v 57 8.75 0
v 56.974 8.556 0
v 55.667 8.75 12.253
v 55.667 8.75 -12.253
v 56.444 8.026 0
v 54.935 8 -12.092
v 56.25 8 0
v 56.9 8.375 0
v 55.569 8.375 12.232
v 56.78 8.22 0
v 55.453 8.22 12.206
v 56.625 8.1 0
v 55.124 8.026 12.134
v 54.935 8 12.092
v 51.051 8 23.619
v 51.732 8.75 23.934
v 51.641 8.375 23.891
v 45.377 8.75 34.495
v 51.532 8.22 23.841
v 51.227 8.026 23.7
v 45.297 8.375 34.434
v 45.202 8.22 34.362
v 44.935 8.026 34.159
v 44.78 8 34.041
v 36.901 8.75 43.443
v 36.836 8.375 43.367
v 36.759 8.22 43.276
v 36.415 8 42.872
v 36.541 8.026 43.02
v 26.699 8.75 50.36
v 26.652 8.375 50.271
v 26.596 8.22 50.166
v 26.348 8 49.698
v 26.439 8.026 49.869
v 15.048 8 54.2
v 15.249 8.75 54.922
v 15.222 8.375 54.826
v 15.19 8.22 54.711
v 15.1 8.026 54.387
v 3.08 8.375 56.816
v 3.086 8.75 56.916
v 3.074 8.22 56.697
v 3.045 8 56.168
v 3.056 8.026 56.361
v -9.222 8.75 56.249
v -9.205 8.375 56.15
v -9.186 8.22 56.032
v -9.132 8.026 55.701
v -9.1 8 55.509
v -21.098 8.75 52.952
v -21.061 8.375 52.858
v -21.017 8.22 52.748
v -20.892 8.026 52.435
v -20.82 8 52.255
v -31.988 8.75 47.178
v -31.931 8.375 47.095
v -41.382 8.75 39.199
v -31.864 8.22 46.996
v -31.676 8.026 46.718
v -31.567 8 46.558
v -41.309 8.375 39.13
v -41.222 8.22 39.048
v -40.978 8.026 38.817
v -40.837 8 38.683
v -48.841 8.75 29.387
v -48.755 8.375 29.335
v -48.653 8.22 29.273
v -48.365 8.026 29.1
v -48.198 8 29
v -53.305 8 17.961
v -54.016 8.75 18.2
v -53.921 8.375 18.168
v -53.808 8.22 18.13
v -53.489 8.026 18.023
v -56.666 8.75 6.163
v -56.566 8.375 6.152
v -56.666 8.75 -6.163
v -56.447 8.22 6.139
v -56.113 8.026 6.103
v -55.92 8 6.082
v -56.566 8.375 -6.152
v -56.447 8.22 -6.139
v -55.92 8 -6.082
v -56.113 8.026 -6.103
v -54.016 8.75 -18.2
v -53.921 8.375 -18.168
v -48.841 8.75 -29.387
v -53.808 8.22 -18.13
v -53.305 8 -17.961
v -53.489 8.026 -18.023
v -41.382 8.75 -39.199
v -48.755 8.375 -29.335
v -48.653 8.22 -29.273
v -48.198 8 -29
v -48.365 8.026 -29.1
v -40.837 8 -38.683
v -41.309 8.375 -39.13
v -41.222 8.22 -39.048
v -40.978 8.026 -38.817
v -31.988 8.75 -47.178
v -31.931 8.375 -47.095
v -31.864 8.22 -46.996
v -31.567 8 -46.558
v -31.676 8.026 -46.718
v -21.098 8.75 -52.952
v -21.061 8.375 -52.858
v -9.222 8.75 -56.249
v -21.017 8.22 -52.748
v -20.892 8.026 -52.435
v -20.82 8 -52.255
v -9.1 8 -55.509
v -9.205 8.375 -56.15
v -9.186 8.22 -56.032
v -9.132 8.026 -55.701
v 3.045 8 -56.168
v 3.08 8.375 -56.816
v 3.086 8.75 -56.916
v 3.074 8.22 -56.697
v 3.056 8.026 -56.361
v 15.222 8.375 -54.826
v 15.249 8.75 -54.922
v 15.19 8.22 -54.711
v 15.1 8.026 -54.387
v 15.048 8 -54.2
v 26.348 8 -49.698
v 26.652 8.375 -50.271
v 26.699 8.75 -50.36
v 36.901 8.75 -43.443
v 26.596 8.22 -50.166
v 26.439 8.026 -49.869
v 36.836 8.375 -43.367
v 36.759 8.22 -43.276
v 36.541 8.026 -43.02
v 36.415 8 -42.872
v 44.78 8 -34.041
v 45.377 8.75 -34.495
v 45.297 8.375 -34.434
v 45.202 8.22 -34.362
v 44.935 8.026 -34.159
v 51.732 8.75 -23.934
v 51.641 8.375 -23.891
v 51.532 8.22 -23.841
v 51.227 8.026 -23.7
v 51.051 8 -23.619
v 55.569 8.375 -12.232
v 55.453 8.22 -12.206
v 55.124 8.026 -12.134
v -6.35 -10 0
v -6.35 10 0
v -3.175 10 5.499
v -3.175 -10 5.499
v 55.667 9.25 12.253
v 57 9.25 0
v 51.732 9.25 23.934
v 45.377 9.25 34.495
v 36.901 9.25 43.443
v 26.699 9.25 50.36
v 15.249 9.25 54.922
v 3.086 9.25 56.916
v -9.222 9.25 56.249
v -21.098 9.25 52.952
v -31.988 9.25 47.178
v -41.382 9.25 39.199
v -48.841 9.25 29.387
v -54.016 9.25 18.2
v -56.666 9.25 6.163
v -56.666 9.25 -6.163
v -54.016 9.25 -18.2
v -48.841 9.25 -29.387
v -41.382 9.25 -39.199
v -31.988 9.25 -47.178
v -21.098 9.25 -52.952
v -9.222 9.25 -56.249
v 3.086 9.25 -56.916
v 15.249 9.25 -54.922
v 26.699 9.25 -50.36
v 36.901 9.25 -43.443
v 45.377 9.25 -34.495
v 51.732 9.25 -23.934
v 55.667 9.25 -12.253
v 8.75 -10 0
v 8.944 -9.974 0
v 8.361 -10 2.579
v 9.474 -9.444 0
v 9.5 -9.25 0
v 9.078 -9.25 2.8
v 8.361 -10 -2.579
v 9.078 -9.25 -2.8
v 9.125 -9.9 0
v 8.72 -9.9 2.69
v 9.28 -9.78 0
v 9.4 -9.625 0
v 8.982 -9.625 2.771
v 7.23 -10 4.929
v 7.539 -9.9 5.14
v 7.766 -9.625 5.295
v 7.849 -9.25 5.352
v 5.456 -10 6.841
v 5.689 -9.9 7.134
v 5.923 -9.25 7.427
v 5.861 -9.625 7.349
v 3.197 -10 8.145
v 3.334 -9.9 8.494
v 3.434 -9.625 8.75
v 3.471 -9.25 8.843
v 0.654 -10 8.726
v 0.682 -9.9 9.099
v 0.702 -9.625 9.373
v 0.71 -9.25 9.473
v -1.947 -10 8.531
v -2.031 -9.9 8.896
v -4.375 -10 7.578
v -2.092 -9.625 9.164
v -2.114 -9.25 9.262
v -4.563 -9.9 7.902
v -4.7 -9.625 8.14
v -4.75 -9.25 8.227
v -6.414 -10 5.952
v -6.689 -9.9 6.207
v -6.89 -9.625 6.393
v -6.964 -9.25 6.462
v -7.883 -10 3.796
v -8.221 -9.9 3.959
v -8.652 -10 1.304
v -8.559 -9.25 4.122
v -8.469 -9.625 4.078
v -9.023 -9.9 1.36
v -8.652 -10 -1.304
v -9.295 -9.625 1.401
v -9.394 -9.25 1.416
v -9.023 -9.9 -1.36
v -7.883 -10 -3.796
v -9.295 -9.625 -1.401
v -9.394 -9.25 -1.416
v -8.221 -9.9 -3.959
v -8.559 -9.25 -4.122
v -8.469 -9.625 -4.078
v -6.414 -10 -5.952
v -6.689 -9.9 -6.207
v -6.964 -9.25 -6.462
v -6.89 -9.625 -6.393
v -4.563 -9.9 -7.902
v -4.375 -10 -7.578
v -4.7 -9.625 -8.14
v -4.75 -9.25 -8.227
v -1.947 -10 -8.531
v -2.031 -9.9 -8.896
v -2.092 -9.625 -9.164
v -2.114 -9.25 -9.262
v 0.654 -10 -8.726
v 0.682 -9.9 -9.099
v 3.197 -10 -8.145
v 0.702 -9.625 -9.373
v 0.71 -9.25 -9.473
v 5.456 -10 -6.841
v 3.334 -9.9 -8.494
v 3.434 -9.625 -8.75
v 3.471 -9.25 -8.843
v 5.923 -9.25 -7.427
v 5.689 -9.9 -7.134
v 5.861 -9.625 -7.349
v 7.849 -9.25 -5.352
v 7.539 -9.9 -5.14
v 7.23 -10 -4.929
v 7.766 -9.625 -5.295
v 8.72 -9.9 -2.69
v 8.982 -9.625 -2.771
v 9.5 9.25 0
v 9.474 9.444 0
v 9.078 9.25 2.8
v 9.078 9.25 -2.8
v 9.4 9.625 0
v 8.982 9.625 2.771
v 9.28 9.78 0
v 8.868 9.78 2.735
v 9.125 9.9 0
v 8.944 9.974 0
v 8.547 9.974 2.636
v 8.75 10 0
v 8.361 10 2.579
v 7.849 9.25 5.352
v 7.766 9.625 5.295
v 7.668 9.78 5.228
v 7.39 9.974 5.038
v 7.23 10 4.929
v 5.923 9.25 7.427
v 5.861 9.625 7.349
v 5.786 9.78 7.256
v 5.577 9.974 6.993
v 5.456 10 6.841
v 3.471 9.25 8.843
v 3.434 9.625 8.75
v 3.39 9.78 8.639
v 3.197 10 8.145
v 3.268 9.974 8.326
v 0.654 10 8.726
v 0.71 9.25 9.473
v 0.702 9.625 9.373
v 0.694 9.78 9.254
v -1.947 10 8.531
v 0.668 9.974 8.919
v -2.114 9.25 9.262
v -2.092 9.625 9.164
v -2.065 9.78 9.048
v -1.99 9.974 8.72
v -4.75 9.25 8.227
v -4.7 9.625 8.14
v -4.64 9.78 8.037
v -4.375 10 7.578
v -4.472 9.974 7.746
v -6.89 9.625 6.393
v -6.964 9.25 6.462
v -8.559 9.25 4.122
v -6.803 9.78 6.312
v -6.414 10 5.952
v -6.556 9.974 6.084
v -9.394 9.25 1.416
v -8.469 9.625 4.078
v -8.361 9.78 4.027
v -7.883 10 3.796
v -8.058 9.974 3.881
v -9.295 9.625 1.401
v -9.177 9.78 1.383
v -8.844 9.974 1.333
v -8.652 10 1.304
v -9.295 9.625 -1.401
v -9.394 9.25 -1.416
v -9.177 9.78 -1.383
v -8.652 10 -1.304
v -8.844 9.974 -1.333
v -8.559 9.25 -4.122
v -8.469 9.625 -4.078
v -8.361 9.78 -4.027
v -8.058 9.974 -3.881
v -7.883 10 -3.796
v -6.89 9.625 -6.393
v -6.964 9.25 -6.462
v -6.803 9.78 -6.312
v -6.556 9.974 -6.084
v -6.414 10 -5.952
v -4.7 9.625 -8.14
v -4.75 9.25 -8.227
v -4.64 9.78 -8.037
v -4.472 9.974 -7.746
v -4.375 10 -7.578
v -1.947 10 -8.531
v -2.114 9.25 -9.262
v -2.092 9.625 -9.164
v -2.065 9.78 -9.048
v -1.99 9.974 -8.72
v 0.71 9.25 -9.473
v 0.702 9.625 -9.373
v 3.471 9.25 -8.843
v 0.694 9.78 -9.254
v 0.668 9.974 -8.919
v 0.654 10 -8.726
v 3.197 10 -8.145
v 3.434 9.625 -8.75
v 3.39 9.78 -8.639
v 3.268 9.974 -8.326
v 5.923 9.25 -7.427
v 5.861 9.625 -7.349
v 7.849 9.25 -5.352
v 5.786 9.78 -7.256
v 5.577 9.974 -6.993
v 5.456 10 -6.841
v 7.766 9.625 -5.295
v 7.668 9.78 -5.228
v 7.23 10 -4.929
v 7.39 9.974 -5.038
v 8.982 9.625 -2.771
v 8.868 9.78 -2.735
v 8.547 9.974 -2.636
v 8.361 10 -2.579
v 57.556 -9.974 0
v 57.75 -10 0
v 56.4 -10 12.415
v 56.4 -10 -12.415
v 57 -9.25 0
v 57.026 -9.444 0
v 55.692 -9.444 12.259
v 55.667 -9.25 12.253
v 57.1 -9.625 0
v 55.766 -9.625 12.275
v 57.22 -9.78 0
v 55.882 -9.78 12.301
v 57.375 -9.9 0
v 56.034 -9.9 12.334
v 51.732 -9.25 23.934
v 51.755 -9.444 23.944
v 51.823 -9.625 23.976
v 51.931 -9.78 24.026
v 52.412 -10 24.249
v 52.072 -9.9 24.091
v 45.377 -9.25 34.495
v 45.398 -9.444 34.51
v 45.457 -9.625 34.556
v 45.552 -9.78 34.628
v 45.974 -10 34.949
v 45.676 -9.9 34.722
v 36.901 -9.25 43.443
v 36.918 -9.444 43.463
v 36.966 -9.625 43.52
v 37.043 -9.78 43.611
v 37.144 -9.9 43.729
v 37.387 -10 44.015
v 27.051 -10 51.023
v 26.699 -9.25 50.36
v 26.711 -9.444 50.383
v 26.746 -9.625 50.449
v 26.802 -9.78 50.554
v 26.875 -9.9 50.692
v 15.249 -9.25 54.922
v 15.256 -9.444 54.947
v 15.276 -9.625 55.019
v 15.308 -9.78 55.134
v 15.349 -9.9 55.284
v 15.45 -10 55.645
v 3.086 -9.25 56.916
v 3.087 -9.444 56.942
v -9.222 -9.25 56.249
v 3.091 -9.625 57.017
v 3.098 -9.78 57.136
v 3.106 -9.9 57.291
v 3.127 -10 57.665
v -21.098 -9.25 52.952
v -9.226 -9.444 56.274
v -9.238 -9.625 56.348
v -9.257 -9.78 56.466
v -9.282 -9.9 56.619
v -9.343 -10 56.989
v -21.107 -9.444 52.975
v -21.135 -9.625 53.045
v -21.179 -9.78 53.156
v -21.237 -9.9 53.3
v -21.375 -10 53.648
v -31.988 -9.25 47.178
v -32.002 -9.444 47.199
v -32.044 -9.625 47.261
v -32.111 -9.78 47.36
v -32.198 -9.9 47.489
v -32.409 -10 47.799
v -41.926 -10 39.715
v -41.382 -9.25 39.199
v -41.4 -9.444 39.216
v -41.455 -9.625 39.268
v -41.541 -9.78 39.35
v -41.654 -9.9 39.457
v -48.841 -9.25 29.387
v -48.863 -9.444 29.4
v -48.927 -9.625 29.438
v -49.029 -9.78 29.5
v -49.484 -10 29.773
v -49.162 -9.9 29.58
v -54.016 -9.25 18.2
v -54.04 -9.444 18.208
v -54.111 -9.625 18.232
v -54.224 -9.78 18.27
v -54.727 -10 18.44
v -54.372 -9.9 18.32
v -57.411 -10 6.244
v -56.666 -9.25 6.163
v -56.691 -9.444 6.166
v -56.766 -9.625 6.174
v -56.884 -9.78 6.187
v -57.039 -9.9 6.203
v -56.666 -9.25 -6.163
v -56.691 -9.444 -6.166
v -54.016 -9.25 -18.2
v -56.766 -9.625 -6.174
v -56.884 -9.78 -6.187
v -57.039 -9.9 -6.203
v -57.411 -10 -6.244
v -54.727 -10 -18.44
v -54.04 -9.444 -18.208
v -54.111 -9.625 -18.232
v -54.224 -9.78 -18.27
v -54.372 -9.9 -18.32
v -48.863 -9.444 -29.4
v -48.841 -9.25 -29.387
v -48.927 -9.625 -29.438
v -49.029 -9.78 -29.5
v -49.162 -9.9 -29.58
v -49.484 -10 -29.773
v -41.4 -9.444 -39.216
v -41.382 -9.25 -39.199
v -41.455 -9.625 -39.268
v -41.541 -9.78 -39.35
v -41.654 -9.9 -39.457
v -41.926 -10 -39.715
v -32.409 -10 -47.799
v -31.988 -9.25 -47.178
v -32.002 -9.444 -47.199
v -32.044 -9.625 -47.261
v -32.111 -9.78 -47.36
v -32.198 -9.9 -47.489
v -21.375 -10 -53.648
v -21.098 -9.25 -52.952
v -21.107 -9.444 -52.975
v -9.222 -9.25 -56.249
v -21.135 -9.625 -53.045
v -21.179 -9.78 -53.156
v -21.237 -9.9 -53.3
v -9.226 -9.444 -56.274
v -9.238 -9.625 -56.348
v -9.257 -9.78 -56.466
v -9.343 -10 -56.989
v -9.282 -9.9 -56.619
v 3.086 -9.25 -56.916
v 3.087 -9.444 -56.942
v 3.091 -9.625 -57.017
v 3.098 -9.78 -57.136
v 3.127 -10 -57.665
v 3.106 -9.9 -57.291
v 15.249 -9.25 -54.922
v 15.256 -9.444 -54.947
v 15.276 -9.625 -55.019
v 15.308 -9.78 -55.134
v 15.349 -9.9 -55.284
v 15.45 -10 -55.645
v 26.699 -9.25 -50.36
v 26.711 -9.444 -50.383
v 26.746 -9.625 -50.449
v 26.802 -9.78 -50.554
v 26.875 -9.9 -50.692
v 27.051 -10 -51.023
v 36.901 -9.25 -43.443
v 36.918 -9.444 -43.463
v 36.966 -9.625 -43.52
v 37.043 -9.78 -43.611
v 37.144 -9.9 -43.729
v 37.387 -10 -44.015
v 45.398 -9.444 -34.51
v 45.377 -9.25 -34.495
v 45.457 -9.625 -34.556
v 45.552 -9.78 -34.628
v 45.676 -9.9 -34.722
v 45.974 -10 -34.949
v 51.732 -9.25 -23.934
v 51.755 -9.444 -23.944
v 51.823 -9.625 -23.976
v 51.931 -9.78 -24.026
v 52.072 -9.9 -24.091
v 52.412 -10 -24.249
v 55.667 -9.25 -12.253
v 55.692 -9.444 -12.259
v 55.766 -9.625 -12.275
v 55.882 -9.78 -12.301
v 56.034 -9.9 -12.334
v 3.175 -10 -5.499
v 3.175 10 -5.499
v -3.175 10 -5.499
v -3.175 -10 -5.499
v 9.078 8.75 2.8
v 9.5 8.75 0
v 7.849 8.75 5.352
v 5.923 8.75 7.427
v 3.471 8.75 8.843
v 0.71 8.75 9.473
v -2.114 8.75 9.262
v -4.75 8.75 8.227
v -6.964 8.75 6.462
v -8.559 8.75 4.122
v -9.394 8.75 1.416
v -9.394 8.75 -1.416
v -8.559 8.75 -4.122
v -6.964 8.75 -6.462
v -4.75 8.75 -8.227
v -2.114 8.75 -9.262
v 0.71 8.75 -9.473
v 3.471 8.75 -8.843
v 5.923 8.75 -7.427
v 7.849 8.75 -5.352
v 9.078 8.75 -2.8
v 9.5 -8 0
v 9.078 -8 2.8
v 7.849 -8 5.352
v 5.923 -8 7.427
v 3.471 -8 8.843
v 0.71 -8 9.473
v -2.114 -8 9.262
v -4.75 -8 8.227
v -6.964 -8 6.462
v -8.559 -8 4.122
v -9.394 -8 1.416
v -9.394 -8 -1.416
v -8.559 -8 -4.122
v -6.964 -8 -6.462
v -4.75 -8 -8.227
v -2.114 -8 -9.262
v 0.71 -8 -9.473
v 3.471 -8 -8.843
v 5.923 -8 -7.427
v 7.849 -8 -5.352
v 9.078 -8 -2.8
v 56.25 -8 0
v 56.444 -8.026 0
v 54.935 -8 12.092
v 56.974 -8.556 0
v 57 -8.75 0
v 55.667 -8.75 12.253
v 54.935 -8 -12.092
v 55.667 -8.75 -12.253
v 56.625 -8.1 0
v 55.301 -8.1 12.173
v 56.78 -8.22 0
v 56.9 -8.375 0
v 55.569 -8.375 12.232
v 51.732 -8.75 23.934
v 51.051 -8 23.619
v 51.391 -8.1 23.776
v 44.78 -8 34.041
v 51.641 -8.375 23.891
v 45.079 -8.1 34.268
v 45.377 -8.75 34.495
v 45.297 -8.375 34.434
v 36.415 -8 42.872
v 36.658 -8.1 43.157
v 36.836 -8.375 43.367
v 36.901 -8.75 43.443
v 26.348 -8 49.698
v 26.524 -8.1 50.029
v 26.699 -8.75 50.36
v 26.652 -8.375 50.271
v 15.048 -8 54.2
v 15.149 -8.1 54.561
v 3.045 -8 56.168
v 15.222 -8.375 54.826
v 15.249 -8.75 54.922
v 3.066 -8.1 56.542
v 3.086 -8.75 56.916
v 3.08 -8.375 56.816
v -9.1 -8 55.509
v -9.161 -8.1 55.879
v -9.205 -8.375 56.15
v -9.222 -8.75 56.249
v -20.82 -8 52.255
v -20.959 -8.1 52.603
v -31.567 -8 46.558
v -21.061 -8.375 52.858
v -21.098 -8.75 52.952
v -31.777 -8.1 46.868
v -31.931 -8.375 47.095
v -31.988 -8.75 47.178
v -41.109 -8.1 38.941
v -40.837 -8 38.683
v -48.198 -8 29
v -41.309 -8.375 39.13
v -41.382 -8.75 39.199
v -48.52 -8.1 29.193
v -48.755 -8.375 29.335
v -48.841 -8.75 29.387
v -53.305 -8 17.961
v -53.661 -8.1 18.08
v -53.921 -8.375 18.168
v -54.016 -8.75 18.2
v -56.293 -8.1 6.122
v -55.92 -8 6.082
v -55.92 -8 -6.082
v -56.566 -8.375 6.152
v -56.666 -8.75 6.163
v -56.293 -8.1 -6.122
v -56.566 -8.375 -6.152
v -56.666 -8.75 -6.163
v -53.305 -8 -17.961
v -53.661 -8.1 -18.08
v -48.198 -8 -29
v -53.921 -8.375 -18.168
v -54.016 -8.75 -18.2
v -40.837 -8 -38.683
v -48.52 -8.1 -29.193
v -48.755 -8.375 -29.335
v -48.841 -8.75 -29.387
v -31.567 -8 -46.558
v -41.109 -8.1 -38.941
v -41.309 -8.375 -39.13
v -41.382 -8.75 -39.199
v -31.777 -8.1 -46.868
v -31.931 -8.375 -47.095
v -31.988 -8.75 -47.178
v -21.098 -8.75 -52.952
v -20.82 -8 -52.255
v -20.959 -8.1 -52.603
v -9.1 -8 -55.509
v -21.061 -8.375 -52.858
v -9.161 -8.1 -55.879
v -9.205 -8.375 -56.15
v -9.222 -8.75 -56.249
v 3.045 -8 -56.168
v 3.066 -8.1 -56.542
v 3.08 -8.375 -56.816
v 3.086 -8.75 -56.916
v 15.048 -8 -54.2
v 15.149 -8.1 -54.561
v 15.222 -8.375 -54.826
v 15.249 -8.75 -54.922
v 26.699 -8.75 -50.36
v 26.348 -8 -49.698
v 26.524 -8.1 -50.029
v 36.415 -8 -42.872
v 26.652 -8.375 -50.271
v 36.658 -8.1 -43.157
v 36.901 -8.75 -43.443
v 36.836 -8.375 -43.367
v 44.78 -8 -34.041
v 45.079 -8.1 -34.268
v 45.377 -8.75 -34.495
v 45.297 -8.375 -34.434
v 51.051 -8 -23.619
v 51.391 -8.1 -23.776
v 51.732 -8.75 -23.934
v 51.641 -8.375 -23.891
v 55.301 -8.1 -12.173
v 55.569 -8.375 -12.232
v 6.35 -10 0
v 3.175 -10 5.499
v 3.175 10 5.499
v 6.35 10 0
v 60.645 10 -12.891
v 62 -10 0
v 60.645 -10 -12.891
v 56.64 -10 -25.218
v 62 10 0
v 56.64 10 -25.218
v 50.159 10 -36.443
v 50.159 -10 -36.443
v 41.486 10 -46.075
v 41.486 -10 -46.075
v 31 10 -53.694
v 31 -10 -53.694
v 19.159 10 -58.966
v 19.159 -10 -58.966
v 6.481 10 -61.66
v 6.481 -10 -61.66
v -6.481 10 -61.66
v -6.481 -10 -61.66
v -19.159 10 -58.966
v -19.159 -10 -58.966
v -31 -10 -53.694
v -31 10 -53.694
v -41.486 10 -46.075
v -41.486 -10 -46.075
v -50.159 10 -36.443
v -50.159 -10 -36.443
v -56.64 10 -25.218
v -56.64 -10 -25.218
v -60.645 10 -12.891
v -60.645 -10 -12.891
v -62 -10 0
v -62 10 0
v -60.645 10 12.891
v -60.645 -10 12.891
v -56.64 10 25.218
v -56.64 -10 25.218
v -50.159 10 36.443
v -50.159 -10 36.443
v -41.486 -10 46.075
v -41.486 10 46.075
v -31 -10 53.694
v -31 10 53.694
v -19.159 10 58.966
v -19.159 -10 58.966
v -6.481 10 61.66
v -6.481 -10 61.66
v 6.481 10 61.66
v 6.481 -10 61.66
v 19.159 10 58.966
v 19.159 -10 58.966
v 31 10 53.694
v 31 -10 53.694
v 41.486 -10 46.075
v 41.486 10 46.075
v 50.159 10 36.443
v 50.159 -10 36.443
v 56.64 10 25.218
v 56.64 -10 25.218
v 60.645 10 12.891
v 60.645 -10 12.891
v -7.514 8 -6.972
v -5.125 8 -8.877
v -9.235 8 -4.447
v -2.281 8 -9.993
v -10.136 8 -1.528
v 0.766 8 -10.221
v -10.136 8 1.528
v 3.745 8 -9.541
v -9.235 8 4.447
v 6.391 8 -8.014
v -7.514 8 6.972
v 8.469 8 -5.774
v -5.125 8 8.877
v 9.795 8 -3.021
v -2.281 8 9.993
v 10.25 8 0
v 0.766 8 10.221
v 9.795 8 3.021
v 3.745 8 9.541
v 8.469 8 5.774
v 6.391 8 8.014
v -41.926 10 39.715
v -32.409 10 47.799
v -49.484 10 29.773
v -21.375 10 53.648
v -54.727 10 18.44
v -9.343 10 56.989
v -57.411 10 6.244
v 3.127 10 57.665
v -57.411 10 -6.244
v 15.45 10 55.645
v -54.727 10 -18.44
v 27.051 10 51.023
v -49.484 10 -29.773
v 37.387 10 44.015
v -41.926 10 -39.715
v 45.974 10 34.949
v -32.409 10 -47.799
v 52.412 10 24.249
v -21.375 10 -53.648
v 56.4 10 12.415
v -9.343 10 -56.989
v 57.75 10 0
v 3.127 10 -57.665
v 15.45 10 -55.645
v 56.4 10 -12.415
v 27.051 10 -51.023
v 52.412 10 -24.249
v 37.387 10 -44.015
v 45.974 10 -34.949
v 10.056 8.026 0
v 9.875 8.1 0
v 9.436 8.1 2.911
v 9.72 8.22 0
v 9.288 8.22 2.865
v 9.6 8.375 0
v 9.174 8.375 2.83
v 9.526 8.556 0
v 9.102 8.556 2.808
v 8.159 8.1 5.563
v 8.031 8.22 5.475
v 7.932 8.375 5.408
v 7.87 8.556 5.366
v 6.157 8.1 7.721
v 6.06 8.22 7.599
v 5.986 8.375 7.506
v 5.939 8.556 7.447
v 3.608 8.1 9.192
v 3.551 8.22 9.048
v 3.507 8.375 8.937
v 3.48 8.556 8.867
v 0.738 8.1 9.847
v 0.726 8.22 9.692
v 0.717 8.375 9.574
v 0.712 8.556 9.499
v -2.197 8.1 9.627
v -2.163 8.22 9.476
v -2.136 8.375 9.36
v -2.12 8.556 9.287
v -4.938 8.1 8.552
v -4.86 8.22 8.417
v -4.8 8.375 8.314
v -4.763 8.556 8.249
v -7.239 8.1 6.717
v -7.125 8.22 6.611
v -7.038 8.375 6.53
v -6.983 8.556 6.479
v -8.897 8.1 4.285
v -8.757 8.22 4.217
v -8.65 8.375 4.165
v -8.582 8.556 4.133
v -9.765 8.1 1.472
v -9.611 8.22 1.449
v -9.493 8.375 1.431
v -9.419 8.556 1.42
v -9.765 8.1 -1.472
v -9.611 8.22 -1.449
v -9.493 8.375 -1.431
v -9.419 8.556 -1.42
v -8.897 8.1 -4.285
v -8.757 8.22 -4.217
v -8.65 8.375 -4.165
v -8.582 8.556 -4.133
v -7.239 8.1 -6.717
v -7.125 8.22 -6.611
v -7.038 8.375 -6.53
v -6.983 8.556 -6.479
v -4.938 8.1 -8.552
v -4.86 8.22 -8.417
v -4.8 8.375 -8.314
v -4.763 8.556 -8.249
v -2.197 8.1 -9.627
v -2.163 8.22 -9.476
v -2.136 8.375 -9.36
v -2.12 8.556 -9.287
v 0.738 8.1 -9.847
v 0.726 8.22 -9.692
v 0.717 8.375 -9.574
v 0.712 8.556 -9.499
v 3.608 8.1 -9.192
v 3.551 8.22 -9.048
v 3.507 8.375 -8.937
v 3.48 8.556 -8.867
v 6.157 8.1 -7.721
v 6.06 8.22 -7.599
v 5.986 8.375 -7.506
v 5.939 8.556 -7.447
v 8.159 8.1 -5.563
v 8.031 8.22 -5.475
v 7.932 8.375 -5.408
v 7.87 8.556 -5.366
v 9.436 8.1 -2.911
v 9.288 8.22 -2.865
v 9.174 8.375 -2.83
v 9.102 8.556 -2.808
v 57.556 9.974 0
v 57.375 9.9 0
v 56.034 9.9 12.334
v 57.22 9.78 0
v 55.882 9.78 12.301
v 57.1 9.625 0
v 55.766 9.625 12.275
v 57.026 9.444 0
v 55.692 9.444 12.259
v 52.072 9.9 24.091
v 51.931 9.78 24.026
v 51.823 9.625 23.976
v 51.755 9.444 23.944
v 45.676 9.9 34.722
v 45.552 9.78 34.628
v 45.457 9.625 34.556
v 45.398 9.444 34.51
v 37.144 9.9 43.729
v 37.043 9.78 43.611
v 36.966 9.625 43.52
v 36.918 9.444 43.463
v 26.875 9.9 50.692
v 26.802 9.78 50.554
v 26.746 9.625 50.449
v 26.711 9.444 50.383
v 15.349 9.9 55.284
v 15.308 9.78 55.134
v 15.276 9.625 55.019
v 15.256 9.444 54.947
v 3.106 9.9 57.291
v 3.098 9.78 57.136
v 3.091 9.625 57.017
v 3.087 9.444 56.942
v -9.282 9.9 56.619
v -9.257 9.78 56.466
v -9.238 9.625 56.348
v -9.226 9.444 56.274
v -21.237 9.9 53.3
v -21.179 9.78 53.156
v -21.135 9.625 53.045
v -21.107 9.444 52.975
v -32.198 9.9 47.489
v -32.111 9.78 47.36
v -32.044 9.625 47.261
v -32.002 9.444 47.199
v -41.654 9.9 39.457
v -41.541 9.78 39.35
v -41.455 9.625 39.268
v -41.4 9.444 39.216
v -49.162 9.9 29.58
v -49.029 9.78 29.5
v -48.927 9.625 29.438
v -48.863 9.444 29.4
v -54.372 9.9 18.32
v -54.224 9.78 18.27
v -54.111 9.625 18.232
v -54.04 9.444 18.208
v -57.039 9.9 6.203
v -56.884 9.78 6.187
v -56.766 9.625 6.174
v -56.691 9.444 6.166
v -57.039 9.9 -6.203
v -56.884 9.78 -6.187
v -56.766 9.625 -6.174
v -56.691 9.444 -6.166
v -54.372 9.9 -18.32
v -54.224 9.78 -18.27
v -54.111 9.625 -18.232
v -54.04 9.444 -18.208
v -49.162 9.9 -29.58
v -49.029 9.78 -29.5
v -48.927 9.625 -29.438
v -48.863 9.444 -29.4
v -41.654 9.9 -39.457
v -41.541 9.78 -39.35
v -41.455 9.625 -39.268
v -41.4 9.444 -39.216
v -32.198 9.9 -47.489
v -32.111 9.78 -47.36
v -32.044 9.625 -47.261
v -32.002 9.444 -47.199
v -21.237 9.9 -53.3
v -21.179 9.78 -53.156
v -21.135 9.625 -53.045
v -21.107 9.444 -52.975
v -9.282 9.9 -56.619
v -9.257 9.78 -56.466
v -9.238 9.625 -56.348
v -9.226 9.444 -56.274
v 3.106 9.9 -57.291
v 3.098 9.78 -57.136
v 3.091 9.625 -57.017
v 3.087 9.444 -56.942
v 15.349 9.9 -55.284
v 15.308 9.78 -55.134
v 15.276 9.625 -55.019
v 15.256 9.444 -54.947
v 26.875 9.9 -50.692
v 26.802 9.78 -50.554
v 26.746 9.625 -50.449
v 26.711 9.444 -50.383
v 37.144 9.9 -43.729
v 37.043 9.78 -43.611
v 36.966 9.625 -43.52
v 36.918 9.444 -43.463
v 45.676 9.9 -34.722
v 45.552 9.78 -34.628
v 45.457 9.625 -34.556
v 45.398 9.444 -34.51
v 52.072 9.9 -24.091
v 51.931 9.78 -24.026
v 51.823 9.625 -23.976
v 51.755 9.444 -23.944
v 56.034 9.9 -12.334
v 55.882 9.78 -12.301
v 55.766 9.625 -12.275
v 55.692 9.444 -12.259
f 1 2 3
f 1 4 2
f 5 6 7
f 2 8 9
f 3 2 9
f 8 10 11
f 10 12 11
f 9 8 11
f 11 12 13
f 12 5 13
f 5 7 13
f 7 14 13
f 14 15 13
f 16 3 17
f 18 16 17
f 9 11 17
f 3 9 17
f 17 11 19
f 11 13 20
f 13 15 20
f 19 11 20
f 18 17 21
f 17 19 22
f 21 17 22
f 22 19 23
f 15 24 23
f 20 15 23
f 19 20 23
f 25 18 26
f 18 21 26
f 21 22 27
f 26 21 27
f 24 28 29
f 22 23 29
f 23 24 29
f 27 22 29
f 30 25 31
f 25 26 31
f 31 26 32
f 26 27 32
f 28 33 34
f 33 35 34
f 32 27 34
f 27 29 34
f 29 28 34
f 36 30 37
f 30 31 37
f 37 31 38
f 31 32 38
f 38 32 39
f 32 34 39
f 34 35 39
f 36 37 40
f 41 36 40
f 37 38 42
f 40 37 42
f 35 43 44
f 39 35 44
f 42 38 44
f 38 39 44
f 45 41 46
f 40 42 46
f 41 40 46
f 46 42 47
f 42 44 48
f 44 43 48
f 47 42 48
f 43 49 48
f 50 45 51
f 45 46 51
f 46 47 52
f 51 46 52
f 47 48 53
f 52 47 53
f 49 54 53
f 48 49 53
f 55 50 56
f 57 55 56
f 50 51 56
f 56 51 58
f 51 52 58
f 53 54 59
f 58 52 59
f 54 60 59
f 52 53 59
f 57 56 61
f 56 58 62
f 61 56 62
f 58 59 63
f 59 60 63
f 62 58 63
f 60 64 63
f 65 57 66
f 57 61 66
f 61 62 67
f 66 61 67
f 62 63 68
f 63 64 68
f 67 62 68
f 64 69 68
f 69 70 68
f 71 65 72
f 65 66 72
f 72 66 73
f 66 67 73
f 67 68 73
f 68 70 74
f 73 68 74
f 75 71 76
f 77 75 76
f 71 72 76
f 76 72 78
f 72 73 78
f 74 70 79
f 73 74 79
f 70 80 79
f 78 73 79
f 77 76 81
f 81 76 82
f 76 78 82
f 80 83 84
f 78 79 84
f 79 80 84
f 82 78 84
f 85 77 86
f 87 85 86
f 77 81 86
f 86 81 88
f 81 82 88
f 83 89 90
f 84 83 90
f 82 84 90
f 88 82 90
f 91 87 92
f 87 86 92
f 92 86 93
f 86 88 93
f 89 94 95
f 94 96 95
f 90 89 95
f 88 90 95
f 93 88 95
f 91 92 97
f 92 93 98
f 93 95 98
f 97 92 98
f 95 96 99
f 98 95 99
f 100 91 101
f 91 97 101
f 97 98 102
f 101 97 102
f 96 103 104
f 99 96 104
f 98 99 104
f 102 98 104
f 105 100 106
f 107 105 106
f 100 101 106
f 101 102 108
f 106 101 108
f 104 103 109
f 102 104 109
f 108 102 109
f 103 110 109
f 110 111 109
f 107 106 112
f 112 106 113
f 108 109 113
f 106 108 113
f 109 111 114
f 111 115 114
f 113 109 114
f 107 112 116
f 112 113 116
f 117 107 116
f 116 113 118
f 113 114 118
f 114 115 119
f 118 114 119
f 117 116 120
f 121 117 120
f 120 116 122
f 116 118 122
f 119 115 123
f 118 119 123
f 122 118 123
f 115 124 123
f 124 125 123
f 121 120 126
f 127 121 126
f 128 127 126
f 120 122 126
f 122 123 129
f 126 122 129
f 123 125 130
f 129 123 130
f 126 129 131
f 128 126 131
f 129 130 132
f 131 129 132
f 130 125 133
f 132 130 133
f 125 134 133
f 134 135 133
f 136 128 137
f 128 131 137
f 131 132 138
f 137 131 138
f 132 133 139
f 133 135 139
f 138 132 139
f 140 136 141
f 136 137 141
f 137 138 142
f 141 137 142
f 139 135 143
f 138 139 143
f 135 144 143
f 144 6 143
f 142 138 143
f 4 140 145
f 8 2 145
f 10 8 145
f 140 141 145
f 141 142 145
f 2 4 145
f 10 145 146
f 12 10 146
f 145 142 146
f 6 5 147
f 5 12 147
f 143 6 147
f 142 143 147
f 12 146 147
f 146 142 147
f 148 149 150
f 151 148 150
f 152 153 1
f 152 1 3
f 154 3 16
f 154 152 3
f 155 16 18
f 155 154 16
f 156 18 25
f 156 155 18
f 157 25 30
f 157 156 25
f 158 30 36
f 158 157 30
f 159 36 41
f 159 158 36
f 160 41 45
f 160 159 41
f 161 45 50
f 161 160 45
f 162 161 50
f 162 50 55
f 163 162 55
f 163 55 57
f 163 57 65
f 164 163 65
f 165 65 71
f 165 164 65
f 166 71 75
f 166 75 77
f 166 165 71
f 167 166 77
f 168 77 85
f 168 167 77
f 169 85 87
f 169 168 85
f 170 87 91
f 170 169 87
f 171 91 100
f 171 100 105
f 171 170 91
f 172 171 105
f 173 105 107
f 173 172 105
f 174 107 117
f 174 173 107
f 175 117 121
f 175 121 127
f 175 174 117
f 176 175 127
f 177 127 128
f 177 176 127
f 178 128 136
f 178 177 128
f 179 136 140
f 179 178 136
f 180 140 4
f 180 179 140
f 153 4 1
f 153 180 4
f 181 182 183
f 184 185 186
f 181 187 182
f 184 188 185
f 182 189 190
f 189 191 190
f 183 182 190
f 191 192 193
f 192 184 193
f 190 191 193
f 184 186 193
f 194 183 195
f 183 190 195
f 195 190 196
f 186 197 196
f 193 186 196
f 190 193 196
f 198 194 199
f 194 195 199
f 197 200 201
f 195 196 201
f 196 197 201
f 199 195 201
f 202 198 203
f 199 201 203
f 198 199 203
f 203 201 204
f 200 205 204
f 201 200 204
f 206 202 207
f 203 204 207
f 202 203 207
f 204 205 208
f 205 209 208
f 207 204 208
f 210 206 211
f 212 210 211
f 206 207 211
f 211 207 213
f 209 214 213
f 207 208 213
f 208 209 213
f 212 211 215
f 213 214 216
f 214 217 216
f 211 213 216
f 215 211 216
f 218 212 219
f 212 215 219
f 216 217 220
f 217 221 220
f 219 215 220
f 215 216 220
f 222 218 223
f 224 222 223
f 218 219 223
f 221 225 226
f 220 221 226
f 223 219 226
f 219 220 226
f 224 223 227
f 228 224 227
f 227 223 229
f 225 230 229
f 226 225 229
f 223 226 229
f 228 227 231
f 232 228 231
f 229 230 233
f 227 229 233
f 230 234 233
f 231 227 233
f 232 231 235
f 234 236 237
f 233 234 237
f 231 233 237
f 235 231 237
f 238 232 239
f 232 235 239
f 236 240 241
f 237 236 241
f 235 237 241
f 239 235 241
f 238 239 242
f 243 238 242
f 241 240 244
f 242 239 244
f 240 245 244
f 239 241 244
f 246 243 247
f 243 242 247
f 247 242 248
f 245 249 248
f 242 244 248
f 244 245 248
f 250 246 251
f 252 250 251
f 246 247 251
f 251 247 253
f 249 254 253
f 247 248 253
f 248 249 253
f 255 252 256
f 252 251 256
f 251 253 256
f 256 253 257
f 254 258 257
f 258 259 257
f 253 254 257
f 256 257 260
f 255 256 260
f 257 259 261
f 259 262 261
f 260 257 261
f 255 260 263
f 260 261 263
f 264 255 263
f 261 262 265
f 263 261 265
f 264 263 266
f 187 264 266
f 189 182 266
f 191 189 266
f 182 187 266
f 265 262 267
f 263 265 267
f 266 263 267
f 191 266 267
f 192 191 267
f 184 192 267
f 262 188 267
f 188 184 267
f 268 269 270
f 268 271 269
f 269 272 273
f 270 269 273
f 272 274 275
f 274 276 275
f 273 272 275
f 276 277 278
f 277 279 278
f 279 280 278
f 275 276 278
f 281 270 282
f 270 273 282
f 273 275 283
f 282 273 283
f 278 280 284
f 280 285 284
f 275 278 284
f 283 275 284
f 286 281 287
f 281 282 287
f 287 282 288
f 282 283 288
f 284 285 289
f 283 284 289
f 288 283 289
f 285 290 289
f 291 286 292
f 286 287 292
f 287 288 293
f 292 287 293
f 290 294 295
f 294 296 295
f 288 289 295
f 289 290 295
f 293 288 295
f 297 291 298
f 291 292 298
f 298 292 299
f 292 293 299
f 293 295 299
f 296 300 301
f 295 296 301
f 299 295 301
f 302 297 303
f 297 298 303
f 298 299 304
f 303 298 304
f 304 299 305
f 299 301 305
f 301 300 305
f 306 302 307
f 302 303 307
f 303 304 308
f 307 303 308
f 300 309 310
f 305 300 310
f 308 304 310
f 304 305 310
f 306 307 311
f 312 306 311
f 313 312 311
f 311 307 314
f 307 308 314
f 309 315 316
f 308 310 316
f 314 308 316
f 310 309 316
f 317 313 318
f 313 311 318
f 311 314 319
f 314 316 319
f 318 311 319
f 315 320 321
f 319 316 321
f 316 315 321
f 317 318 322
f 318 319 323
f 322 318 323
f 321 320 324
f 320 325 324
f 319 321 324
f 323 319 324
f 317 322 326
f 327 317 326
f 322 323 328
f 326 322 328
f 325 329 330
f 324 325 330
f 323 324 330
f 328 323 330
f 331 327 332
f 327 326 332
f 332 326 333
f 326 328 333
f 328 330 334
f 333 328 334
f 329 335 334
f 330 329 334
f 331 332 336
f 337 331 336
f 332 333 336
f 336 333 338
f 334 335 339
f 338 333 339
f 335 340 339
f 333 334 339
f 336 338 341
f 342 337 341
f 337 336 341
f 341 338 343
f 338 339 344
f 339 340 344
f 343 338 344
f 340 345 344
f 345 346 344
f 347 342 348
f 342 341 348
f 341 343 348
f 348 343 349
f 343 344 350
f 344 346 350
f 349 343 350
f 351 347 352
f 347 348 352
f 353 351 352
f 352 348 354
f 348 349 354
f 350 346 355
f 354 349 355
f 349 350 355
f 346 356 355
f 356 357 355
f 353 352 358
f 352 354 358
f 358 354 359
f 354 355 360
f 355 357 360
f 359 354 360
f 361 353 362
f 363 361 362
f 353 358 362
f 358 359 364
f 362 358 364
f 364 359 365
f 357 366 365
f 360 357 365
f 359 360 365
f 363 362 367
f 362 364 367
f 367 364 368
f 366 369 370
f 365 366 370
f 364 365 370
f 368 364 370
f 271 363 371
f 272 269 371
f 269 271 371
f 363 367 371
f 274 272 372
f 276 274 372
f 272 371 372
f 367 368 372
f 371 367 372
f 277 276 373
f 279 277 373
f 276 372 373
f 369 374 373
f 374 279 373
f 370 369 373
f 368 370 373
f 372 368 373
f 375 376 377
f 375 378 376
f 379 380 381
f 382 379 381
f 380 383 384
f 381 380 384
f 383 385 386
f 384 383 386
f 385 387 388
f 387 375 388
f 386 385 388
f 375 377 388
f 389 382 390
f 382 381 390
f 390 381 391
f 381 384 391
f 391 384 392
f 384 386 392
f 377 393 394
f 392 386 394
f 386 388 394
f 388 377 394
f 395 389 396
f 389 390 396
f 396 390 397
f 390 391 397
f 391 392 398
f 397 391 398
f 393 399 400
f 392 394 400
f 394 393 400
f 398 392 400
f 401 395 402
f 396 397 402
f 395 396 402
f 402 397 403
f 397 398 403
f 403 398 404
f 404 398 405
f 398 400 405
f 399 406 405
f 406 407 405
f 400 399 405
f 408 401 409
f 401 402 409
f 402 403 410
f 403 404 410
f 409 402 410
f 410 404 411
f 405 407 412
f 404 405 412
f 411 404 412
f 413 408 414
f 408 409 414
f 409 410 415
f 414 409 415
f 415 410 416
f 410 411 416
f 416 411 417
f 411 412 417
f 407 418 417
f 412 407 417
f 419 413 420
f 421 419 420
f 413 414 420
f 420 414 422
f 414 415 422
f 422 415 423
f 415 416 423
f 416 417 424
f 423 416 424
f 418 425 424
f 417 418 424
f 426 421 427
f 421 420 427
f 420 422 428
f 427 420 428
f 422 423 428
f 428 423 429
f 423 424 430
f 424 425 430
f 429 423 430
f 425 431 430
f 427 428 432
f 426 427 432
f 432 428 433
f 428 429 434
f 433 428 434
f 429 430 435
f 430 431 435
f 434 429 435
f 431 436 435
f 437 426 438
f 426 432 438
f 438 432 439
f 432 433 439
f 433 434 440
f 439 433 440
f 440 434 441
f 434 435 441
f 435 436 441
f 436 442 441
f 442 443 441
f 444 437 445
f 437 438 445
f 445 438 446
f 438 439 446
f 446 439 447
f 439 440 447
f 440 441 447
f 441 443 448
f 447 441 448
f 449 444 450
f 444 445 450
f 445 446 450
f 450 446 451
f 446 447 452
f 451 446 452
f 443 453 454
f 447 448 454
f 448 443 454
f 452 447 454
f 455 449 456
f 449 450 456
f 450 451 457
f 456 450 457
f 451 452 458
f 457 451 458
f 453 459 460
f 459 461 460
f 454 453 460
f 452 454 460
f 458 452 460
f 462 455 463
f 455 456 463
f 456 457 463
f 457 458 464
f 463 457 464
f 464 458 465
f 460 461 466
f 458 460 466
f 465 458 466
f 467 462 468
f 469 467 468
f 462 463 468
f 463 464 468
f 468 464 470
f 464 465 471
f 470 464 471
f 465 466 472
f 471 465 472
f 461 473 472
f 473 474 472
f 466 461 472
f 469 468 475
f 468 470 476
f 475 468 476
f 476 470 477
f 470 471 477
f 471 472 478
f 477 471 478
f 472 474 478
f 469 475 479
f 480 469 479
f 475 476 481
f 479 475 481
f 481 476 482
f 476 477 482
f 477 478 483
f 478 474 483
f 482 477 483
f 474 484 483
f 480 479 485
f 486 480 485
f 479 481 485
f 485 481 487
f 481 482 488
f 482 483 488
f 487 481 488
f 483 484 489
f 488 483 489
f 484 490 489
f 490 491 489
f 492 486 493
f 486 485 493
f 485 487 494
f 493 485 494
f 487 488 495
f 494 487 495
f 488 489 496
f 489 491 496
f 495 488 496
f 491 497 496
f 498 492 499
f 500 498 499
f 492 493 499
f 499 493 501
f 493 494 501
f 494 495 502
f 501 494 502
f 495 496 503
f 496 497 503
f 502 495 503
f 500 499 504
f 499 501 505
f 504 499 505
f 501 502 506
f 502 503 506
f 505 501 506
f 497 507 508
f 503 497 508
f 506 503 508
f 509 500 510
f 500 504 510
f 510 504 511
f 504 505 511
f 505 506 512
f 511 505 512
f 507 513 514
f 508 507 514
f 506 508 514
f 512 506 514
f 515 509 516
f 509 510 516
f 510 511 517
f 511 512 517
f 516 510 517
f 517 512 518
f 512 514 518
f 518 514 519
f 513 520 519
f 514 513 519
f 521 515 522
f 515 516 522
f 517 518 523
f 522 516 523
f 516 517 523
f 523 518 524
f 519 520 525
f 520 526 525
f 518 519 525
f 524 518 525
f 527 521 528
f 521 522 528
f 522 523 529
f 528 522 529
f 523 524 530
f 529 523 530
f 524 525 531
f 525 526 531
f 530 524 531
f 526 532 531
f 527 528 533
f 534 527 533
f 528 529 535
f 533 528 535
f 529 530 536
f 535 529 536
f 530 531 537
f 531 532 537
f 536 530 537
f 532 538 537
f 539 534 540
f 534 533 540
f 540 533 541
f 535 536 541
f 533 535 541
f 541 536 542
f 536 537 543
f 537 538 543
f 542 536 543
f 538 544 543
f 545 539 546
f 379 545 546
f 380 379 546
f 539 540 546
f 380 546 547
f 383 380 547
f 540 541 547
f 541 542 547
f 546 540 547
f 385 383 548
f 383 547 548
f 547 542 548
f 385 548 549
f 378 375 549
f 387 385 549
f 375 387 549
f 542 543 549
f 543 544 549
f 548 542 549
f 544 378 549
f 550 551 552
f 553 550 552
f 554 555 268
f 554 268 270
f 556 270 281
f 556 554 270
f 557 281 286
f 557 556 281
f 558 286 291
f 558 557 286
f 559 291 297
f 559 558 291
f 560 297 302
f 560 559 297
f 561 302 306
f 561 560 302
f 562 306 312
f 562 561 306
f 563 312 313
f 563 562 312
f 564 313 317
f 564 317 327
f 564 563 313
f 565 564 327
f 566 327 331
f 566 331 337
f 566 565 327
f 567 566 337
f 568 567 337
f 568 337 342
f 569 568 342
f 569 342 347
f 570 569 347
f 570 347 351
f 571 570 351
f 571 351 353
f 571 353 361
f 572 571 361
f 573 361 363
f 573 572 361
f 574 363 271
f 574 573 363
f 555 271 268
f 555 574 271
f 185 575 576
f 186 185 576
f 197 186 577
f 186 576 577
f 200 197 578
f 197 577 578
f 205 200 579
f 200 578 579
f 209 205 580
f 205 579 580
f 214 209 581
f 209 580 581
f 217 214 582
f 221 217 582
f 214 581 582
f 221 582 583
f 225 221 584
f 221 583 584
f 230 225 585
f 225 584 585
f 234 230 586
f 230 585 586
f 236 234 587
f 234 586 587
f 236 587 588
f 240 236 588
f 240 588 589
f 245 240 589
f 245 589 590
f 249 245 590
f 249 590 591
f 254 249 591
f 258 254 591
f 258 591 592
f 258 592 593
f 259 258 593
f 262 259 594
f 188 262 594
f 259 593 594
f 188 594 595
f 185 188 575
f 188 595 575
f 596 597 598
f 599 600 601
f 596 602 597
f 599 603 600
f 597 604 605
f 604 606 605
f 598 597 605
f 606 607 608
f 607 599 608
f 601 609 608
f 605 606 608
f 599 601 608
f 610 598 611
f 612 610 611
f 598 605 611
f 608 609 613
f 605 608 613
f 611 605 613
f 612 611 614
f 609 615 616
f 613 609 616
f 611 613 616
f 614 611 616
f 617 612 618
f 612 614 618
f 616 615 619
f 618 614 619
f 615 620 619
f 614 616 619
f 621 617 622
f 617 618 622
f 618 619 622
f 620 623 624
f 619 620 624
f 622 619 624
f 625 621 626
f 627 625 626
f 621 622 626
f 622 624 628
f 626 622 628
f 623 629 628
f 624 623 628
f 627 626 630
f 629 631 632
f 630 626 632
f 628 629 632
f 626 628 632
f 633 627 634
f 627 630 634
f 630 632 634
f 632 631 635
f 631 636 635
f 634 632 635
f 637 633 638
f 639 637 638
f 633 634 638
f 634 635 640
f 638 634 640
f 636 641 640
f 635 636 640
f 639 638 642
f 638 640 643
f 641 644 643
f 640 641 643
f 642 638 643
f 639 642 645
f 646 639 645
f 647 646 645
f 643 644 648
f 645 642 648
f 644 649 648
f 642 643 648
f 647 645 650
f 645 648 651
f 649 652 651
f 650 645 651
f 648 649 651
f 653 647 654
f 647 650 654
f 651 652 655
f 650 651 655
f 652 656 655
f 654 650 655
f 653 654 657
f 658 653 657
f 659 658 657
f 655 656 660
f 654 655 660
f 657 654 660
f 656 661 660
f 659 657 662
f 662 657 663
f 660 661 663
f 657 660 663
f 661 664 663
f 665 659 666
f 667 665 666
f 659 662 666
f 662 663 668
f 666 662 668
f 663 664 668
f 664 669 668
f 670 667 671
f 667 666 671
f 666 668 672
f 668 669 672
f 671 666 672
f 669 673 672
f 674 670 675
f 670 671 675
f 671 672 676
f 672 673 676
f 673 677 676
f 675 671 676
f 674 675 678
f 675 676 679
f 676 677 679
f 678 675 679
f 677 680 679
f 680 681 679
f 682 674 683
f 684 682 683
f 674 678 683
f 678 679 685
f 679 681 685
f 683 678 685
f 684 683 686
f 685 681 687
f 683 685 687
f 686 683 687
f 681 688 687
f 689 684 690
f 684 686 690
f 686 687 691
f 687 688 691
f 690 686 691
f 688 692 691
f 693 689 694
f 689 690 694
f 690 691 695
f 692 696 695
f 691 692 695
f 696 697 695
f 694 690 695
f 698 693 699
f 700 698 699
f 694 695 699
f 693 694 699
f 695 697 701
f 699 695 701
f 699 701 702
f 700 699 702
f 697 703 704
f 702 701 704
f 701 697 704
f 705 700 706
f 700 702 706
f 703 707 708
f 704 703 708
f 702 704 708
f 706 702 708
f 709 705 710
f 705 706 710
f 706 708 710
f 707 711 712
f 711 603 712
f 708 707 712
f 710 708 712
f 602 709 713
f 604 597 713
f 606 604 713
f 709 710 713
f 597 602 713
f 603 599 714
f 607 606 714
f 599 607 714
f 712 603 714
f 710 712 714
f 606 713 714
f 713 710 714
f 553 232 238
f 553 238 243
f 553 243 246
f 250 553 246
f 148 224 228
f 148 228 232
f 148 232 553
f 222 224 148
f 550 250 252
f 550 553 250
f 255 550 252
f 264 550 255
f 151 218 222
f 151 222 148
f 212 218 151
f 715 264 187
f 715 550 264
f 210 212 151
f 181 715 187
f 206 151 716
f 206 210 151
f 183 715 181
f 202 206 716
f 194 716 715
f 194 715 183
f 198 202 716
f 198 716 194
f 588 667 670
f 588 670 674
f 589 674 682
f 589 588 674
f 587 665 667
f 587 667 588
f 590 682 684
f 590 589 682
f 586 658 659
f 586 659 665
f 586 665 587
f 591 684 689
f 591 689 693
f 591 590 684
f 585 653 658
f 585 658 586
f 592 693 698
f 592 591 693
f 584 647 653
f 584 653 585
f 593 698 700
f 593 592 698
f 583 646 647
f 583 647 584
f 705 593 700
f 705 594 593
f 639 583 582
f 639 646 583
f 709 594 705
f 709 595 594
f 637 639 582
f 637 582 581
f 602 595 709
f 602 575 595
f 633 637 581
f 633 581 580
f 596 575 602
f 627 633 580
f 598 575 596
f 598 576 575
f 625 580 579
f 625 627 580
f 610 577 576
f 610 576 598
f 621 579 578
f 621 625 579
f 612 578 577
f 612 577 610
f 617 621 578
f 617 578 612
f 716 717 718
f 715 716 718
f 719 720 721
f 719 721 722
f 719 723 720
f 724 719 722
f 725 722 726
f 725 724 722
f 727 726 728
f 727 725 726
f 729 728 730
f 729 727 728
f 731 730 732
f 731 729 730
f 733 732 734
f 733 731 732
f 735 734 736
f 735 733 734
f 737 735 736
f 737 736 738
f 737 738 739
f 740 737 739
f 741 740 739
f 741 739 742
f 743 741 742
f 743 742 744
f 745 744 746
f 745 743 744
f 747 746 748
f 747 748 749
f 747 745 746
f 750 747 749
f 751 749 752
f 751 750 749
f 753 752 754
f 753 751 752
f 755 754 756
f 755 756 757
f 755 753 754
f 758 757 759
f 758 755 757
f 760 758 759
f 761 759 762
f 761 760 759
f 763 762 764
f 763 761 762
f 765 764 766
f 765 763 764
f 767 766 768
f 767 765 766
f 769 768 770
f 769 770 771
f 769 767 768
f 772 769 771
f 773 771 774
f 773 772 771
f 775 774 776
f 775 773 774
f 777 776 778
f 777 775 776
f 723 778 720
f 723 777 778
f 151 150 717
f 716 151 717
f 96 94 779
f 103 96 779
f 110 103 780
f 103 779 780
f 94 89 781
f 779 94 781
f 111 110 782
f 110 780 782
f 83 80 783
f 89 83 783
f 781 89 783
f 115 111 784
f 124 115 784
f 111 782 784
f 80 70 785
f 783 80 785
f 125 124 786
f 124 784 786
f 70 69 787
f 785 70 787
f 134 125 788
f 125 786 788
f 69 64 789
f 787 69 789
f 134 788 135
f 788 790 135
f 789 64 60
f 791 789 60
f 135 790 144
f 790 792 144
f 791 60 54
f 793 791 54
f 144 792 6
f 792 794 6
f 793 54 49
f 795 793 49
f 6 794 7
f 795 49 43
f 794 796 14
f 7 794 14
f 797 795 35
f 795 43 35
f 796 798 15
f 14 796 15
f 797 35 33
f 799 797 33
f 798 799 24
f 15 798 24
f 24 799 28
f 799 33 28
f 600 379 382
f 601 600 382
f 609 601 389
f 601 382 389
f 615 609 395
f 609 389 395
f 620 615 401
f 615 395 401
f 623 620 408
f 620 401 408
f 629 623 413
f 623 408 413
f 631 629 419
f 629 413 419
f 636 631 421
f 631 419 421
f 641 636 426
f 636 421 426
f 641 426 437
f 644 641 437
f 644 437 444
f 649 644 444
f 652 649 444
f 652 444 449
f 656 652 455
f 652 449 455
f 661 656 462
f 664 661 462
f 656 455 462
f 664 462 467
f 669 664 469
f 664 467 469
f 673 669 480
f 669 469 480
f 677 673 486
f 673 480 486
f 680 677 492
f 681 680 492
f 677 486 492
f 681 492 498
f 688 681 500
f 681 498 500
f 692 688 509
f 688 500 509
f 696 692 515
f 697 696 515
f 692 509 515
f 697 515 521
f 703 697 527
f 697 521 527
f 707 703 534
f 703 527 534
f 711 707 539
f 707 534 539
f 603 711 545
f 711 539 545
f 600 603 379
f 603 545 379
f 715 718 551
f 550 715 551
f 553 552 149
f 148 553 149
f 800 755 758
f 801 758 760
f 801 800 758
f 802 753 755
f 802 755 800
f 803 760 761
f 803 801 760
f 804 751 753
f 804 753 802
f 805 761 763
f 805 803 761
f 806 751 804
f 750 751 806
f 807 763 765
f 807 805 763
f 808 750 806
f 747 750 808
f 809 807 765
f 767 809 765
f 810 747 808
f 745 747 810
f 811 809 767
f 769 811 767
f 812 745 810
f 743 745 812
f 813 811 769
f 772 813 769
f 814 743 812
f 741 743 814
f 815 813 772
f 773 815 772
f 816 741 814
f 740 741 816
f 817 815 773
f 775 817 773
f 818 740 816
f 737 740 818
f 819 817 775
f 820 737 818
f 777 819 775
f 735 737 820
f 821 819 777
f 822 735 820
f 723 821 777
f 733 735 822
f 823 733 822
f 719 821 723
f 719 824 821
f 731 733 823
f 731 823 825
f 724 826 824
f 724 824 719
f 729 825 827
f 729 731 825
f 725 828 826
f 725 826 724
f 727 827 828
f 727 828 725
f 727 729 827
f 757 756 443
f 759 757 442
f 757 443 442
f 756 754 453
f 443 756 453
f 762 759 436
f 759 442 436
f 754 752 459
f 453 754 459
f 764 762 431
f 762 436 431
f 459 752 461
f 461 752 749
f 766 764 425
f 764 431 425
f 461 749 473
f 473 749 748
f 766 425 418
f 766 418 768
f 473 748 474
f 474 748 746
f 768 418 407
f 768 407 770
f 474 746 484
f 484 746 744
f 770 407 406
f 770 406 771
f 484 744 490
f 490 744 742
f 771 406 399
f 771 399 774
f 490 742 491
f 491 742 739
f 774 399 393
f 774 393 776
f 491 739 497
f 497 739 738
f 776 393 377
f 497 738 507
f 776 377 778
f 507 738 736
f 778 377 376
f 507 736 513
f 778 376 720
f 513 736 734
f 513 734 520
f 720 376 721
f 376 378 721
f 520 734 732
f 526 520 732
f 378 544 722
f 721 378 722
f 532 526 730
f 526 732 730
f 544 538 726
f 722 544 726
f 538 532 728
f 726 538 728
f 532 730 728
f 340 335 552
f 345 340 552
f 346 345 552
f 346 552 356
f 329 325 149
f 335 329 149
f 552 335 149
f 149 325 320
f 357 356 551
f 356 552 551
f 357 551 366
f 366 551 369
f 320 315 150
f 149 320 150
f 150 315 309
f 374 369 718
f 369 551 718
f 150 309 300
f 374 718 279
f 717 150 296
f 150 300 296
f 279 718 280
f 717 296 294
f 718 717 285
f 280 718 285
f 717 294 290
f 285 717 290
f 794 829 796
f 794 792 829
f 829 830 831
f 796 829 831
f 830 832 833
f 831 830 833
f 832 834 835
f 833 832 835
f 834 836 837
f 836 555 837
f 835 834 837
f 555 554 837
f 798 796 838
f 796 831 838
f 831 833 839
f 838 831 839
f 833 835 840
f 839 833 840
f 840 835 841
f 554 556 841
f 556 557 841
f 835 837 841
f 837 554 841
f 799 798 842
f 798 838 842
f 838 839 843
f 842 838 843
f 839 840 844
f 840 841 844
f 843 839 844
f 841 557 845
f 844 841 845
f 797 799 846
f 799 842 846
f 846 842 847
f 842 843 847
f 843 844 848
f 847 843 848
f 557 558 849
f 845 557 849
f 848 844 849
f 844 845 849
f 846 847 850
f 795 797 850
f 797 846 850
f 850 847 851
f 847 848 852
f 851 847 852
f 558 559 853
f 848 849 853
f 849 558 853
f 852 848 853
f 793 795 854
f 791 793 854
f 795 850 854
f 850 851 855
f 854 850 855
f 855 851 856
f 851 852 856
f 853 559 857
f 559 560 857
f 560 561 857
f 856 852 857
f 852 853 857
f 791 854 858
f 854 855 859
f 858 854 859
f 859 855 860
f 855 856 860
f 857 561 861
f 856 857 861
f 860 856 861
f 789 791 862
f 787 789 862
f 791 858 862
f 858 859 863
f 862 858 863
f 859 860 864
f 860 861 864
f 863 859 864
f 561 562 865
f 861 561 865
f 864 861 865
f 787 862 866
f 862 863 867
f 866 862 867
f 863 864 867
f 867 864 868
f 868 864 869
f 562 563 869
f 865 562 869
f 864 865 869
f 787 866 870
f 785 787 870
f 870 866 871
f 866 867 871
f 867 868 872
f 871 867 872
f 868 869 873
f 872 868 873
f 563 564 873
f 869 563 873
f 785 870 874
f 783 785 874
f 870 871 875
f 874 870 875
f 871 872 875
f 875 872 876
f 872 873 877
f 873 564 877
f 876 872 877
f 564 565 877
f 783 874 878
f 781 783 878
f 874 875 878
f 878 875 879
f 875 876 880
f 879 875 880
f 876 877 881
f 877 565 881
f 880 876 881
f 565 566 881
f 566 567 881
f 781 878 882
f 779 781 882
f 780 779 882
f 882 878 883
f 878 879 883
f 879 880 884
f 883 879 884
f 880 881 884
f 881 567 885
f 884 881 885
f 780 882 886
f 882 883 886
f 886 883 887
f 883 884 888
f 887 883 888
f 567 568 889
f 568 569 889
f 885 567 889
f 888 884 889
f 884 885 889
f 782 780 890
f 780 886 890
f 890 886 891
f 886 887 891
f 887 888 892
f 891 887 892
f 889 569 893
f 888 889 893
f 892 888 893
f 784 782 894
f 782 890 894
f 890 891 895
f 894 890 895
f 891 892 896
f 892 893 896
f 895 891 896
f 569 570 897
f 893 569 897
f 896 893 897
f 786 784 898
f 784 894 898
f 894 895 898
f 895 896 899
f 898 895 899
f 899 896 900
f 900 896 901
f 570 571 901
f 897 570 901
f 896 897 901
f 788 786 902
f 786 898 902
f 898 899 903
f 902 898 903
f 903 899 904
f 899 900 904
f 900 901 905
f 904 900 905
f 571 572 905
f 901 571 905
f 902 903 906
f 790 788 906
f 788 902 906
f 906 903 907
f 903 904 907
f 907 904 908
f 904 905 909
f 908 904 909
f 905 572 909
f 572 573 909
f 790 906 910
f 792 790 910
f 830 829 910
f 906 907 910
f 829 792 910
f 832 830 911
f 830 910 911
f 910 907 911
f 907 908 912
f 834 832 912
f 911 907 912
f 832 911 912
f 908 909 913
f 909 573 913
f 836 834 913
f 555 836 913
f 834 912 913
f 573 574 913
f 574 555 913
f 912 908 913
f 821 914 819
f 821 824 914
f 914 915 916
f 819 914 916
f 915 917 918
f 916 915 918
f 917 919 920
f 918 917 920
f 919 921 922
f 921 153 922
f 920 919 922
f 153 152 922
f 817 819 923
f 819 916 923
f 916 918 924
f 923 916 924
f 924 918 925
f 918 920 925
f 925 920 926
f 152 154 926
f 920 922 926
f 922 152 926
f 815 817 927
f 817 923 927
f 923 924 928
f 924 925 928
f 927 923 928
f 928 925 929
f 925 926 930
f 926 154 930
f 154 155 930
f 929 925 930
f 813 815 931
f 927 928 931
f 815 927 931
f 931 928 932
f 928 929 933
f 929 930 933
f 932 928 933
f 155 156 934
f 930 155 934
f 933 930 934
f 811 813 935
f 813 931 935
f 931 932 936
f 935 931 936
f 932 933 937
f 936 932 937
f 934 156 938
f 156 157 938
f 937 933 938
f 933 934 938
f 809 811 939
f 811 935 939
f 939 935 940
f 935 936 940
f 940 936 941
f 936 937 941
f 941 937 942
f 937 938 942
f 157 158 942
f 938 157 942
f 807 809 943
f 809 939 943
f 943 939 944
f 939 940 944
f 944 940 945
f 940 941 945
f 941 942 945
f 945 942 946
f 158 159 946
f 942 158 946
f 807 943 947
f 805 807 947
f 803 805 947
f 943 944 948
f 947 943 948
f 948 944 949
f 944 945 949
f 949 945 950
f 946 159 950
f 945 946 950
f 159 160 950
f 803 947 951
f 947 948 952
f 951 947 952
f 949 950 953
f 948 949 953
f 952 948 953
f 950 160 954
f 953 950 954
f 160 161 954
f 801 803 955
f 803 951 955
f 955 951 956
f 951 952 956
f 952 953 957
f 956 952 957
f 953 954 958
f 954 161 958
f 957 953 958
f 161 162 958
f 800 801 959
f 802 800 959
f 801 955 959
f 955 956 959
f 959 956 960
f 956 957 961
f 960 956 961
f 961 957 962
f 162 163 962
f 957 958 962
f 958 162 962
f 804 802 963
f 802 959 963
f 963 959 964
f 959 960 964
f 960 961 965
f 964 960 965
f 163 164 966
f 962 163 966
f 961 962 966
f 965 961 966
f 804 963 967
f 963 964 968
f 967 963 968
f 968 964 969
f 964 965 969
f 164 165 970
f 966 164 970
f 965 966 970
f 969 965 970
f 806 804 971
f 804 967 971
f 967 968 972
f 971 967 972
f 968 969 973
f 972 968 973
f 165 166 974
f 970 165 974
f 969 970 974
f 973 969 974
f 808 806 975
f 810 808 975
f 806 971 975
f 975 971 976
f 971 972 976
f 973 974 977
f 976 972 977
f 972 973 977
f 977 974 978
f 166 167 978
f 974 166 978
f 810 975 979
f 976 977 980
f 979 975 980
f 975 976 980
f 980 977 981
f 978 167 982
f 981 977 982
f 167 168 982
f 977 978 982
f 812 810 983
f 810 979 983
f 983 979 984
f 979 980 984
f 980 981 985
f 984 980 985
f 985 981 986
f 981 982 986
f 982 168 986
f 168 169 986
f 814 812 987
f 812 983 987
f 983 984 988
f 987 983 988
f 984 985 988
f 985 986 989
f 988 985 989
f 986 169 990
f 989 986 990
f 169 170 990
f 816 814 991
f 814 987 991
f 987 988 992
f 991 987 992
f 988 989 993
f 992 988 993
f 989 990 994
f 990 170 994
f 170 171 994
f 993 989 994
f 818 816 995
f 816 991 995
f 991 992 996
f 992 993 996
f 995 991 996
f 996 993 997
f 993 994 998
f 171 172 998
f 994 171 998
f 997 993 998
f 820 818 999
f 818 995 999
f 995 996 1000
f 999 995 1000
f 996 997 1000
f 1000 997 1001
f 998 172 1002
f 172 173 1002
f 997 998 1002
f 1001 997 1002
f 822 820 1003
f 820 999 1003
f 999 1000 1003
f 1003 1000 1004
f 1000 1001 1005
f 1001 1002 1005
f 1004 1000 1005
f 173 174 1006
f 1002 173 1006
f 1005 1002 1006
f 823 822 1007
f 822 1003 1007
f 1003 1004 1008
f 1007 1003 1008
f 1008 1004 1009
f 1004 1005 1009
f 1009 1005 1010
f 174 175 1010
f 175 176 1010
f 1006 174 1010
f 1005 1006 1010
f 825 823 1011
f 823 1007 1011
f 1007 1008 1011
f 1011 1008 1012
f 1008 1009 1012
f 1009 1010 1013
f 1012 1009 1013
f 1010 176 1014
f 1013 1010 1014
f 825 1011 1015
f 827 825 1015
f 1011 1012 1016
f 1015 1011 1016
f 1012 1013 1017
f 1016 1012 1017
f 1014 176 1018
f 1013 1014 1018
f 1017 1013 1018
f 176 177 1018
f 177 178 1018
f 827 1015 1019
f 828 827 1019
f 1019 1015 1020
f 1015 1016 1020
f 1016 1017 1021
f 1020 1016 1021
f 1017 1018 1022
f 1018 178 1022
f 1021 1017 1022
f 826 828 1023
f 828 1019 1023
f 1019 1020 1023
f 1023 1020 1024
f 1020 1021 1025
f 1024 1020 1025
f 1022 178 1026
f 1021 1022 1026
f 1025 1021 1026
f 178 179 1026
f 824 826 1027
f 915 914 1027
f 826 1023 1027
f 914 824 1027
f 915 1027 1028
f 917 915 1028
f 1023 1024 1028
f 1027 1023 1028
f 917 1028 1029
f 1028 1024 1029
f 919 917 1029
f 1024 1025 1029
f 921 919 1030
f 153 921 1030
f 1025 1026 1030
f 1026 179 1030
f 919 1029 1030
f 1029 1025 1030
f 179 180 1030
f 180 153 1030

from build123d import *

# Parameters (mm, degrees)
SCHIZZO1_W                    = 62
SCHIZZO1_H                    = 20
SCHIZZO9_R                    = 57
TAGLIO_ESTRUSIONE2_DEPTH      = 2
SCHIZZO10_R                   = 9.5
ESTRUSIONE_ESTRUSIONE3_DEPTH  = 2
TAGLIO_ESTRUSIONE1_DEPTH      = 19
TAGLIO_ESTRUSIONE1_DEPTH_BACK = 3
RACCORDO1_R                   = 0.75


with BuildPart() as part:
    # Schizzo1 → Rivoluzione1 (revolve)
    with BuildSketch(Plane(origin=(0, 0, 0), x_dir=(-1, 0, 0), z_dir=(0, 0, -1))):
        with Locations((-31, 0)):
            Rectangle(SCHIZZO1_W, SCHIZZO1_H)
    revolve(axis=Axis((0, -10, 0), (0, 1, 0)))

    # Schizzo9 → Taglio-Estrusione2 (cut)
    with BuildSketch(Plane.XZ.offset(10)):
        Circle(SCHIZZO9_R)
    taglio_estrusione2 = extrude(amount=-TAGLIO_ESTRUSIONE2_DEPTH, mode=Mode.SUBTRACT)

    # Schizzo10 → Estrusione-Estrusione3 (add)
    with BuildSketch(Plane.XZ.offset(8)):
        Circle(SCHIZZO10_R)
    estrusione_estrusione3 = extrude(amount=ESTRUSIONE_ESTRUSIONE3_DEPTH)

    # Specchia1: Taglio-Estrusione2, Estrusione-Estrusione3 across plane
    add(taglio_estrusione2.mirror(Plane.ZX), mode=Mode.SUBTRACT)
    add(estrusione_estrusione3.mirror(Plane.ZX))

    # Schizzo8 → Taglio-Estrusione1 (cut, two sides)
    with BuildSketch(Plane(origin=(0, -8, 0), x_dir=(-1, 0, 0), z_dir=(0, 1, 0))) as taglio_estrusione1_sk:
        Polygon((-3.175, -5.499261314), (3.175, -5.499261314), (6.35, 0), (3.175, 5.499261314), (-3.175, 5.499261314), (-6.35, 0), align=None)
    extrude(amount=TAGLIO_ESTRUSIONE1_DEPTH, mode=Mode.SUBTRACT)
    extrude(taglio_estrusione1_sk.sketch, amount=-TAGLIO_ESTRUSIONE1_DEPTH_BACK, mode=Mode.SUBTRACT)

    # Raccordo1
    raccordo1_edges = [part.edges().sort_by_distance(p)[0] for p in [
        (-57, -10, 0),
        (-9.5, -10, 0),
        (-57, 10, 0),
        (-57, 8, 0),
        (-9.5, 8, 0),
        (-9.5, 10, 0),
        (-57, -8, 0),
    ]]
    fillet(raccordo1_edges, radius=RACCORDO1_R)


solid = part.part
